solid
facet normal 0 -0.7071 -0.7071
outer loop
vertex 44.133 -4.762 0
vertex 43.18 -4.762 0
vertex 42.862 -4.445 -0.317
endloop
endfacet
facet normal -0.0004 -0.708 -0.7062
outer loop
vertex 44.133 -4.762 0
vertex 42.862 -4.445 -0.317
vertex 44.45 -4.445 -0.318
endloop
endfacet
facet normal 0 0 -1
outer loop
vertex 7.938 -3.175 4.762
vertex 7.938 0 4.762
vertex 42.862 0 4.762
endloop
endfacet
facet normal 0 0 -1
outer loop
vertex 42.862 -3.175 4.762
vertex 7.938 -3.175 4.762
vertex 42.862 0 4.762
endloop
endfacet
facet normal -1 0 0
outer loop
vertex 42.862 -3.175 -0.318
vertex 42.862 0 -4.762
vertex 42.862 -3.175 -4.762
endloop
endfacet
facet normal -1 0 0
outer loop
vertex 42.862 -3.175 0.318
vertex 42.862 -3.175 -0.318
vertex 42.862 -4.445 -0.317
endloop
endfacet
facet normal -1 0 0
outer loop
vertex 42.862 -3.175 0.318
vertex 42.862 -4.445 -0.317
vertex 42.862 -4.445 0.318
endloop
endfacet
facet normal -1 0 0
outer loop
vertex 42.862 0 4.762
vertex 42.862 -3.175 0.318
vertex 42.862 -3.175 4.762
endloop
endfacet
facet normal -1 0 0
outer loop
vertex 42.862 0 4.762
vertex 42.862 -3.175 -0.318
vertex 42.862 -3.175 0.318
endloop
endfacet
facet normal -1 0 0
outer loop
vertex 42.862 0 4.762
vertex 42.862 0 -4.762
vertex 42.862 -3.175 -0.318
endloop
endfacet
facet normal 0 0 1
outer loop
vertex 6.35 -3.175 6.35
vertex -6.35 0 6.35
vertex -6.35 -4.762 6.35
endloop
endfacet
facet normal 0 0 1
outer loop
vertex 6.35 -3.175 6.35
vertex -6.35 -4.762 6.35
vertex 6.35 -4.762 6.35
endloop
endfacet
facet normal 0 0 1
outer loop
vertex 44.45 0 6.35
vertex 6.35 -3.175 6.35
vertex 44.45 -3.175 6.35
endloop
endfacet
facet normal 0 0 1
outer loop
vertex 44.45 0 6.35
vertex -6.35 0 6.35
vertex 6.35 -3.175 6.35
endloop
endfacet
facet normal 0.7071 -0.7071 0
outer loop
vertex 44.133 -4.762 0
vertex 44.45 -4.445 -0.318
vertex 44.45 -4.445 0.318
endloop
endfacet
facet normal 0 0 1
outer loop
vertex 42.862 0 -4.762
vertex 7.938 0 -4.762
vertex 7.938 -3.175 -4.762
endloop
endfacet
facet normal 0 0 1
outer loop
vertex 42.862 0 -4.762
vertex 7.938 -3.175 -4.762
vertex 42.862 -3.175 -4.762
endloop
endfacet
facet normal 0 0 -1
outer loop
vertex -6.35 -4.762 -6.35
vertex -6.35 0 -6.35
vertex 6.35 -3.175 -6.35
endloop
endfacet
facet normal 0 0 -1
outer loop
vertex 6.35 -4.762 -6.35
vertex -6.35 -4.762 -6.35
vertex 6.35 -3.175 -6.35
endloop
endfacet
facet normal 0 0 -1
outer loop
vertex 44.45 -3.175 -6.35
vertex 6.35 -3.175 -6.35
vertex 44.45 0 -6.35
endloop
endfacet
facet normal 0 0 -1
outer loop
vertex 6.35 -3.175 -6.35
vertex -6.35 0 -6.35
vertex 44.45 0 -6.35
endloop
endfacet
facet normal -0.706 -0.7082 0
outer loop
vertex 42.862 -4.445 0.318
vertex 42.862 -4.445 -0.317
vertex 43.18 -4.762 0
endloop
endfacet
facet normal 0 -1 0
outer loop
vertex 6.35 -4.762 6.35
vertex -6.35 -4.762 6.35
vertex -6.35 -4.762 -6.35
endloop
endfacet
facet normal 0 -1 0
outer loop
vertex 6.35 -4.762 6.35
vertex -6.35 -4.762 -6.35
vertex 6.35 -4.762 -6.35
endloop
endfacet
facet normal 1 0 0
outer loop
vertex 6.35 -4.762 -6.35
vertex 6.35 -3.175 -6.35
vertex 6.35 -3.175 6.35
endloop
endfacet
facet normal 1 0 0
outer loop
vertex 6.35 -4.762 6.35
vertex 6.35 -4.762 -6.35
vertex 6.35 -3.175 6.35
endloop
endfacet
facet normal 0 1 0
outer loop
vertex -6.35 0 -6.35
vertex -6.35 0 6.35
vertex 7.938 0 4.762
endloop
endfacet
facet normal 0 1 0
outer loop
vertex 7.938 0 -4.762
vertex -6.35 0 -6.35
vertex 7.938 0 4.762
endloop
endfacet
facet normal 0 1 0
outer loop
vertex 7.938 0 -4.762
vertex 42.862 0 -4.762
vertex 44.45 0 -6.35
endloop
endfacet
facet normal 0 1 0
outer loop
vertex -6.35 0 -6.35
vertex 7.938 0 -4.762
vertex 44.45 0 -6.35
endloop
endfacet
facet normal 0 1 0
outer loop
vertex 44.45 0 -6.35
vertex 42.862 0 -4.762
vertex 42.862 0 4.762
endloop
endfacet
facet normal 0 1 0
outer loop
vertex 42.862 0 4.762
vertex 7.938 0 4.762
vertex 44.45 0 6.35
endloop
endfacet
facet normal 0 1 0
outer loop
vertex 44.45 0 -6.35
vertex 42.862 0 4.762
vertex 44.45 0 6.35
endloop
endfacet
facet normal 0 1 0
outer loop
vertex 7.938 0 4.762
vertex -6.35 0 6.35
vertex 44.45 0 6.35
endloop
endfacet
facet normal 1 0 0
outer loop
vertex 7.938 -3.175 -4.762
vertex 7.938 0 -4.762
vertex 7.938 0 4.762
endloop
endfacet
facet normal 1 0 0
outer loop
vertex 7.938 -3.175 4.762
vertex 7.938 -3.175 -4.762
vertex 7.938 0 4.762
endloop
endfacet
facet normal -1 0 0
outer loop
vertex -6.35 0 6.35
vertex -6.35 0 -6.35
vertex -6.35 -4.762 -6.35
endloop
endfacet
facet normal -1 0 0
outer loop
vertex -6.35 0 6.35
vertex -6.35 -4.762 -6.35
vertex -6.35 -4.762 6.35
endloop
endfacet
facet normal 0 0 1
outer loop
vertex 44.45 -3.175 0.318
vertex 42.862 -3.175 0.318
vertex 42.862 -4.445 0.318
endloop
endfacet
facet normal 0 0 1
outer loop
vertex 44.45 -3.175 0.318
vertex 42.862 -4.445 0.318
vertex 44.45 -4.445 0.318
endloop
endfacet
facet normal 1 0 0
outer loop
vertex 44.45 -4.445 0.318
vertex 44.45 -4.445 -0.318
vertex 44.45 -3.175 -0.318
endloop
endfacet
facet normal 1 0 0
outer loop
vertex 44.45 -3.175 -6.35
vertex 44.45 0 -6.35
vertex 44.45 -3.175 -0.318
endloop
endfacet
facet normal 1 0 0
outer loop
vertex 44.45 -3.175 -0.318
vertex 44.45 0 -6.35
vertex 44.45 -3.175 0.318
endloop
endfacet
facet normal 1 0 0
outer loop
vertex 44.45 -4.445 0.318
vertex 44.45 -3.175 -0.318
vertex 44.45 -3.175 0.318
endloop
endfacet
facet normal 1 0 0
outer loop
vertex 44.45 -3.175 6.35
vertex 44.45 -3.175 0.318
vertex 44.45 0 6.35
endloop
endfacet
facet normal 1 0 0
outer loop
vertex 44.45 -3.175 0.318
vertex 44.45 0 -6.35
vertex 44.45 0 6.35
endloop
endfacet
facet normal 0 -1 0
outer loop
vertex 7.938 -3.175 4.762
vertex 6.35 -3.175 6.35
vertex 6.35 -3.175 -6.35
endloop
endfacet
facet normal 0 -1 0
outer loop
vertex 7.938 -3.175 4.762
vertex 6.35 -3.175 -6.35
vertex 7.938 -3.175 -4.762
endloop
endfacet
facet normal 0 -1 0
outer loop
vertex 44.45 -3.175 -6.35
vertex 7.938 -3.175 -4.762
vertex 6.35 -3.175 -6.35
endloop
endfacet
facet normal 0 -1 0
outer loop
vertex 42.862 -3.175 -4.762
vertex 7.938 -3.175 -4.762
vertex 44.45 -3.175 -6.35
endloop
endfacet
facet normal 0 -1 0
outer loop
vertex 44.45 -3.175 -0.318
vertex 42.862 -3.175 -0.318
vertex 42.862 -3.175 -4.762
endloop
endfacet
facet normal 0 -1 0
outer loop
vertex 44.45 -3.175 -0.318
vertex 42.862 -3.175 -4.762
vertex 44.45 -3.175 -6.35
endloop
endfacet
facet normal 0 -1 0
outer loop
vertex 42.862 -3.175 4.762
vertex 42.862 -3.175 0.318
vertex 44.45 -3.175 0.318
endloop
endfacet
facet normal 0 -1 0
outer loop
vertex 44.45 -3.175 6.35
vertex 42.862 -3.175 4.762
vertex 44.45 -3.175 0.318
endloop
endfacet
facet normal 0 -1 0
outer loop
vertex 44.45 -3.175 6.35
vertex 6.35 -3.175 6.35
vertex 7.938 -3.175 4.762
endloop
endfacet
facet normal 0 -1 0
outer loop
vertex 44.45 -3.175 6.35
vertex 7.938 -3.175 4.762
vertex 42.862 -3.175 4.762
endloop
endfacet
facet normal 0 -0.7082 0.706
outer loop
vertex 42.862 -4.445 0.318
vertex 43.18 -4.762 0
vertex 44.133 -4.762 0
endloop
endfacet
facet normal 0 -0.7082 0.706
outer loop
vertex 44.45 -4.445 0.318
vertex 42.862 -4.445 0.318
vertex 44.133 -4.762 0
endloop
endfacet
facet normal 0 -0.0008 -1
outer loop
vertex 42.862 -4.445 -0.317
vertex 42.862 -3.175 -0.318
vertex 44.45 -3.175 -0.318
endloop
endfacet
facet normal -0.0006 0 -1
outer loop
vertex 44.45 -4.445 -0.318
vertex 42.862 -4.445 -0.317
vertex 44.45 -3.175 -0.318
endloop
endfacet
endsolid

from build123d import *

# Parameters (mm, degrees)
F0_W     = 12.7
F0_H     = 12.7
F1_DEPTH = 4.7625
F2_W     = 38.1
F2_H     = 12.7
F2_W_2   = 34.925
F2_H_2   = 9.525
F3_DEPTH = 3.175
F4_W     = 1.5875
F4_H     = 0.635
F5_DEPTH = 1.5875
F6_SIZE  = 0.31749


# Not quite as in the source:
# - a fillet or chamfer is up to 0.001 mm smaller than in the source, because OpenCascade refuses the exact size


with BuildPart() as f1:
    # F0 (on Front) → F1 (new body)
    with BuildSketch(Plane.XZ):
        Rectangle(F0_W, F0_H)
    extrude(amount=F1_DEPTH)

    # F2 (on Front) → F3 (join)
    with BuildSketch(Plane.XZ):
        with Locations((25.4, 0)):
            Rectangle(F2_W, F2_H)
        with Locations((25.4, 0)):
            Rectangle(F2_W_2, F2_H_2, mode=Mode.SUBTRACT)
    extrude(amount=F3_DEPTH)

    # F4 (on face) → F5 (join)
    with BuildSketch(Plane.XZ.offset(3.175)):
        with Locations((43.65625, 0)):
            Rectangle(F4_W, F4_H)
    extrude(amount=F5_DEPTH)

    # F6 (size 0.3175 in the source; OpenCascade refuses exactly that, so slightly less here)
    f6_edges = [f1.edges().sort_by_distance(p)[0] for p in [
        (43.65625, -4.7625, 0.3175),
        (42.8625, -4.7625, 0),
        (43.65625, -4.7625, -0.3175),
        (44.45, -4.7625, 0),
    ]]
    chamfer(f6_edges, length=F6_SIZE)


solid = f1.part
